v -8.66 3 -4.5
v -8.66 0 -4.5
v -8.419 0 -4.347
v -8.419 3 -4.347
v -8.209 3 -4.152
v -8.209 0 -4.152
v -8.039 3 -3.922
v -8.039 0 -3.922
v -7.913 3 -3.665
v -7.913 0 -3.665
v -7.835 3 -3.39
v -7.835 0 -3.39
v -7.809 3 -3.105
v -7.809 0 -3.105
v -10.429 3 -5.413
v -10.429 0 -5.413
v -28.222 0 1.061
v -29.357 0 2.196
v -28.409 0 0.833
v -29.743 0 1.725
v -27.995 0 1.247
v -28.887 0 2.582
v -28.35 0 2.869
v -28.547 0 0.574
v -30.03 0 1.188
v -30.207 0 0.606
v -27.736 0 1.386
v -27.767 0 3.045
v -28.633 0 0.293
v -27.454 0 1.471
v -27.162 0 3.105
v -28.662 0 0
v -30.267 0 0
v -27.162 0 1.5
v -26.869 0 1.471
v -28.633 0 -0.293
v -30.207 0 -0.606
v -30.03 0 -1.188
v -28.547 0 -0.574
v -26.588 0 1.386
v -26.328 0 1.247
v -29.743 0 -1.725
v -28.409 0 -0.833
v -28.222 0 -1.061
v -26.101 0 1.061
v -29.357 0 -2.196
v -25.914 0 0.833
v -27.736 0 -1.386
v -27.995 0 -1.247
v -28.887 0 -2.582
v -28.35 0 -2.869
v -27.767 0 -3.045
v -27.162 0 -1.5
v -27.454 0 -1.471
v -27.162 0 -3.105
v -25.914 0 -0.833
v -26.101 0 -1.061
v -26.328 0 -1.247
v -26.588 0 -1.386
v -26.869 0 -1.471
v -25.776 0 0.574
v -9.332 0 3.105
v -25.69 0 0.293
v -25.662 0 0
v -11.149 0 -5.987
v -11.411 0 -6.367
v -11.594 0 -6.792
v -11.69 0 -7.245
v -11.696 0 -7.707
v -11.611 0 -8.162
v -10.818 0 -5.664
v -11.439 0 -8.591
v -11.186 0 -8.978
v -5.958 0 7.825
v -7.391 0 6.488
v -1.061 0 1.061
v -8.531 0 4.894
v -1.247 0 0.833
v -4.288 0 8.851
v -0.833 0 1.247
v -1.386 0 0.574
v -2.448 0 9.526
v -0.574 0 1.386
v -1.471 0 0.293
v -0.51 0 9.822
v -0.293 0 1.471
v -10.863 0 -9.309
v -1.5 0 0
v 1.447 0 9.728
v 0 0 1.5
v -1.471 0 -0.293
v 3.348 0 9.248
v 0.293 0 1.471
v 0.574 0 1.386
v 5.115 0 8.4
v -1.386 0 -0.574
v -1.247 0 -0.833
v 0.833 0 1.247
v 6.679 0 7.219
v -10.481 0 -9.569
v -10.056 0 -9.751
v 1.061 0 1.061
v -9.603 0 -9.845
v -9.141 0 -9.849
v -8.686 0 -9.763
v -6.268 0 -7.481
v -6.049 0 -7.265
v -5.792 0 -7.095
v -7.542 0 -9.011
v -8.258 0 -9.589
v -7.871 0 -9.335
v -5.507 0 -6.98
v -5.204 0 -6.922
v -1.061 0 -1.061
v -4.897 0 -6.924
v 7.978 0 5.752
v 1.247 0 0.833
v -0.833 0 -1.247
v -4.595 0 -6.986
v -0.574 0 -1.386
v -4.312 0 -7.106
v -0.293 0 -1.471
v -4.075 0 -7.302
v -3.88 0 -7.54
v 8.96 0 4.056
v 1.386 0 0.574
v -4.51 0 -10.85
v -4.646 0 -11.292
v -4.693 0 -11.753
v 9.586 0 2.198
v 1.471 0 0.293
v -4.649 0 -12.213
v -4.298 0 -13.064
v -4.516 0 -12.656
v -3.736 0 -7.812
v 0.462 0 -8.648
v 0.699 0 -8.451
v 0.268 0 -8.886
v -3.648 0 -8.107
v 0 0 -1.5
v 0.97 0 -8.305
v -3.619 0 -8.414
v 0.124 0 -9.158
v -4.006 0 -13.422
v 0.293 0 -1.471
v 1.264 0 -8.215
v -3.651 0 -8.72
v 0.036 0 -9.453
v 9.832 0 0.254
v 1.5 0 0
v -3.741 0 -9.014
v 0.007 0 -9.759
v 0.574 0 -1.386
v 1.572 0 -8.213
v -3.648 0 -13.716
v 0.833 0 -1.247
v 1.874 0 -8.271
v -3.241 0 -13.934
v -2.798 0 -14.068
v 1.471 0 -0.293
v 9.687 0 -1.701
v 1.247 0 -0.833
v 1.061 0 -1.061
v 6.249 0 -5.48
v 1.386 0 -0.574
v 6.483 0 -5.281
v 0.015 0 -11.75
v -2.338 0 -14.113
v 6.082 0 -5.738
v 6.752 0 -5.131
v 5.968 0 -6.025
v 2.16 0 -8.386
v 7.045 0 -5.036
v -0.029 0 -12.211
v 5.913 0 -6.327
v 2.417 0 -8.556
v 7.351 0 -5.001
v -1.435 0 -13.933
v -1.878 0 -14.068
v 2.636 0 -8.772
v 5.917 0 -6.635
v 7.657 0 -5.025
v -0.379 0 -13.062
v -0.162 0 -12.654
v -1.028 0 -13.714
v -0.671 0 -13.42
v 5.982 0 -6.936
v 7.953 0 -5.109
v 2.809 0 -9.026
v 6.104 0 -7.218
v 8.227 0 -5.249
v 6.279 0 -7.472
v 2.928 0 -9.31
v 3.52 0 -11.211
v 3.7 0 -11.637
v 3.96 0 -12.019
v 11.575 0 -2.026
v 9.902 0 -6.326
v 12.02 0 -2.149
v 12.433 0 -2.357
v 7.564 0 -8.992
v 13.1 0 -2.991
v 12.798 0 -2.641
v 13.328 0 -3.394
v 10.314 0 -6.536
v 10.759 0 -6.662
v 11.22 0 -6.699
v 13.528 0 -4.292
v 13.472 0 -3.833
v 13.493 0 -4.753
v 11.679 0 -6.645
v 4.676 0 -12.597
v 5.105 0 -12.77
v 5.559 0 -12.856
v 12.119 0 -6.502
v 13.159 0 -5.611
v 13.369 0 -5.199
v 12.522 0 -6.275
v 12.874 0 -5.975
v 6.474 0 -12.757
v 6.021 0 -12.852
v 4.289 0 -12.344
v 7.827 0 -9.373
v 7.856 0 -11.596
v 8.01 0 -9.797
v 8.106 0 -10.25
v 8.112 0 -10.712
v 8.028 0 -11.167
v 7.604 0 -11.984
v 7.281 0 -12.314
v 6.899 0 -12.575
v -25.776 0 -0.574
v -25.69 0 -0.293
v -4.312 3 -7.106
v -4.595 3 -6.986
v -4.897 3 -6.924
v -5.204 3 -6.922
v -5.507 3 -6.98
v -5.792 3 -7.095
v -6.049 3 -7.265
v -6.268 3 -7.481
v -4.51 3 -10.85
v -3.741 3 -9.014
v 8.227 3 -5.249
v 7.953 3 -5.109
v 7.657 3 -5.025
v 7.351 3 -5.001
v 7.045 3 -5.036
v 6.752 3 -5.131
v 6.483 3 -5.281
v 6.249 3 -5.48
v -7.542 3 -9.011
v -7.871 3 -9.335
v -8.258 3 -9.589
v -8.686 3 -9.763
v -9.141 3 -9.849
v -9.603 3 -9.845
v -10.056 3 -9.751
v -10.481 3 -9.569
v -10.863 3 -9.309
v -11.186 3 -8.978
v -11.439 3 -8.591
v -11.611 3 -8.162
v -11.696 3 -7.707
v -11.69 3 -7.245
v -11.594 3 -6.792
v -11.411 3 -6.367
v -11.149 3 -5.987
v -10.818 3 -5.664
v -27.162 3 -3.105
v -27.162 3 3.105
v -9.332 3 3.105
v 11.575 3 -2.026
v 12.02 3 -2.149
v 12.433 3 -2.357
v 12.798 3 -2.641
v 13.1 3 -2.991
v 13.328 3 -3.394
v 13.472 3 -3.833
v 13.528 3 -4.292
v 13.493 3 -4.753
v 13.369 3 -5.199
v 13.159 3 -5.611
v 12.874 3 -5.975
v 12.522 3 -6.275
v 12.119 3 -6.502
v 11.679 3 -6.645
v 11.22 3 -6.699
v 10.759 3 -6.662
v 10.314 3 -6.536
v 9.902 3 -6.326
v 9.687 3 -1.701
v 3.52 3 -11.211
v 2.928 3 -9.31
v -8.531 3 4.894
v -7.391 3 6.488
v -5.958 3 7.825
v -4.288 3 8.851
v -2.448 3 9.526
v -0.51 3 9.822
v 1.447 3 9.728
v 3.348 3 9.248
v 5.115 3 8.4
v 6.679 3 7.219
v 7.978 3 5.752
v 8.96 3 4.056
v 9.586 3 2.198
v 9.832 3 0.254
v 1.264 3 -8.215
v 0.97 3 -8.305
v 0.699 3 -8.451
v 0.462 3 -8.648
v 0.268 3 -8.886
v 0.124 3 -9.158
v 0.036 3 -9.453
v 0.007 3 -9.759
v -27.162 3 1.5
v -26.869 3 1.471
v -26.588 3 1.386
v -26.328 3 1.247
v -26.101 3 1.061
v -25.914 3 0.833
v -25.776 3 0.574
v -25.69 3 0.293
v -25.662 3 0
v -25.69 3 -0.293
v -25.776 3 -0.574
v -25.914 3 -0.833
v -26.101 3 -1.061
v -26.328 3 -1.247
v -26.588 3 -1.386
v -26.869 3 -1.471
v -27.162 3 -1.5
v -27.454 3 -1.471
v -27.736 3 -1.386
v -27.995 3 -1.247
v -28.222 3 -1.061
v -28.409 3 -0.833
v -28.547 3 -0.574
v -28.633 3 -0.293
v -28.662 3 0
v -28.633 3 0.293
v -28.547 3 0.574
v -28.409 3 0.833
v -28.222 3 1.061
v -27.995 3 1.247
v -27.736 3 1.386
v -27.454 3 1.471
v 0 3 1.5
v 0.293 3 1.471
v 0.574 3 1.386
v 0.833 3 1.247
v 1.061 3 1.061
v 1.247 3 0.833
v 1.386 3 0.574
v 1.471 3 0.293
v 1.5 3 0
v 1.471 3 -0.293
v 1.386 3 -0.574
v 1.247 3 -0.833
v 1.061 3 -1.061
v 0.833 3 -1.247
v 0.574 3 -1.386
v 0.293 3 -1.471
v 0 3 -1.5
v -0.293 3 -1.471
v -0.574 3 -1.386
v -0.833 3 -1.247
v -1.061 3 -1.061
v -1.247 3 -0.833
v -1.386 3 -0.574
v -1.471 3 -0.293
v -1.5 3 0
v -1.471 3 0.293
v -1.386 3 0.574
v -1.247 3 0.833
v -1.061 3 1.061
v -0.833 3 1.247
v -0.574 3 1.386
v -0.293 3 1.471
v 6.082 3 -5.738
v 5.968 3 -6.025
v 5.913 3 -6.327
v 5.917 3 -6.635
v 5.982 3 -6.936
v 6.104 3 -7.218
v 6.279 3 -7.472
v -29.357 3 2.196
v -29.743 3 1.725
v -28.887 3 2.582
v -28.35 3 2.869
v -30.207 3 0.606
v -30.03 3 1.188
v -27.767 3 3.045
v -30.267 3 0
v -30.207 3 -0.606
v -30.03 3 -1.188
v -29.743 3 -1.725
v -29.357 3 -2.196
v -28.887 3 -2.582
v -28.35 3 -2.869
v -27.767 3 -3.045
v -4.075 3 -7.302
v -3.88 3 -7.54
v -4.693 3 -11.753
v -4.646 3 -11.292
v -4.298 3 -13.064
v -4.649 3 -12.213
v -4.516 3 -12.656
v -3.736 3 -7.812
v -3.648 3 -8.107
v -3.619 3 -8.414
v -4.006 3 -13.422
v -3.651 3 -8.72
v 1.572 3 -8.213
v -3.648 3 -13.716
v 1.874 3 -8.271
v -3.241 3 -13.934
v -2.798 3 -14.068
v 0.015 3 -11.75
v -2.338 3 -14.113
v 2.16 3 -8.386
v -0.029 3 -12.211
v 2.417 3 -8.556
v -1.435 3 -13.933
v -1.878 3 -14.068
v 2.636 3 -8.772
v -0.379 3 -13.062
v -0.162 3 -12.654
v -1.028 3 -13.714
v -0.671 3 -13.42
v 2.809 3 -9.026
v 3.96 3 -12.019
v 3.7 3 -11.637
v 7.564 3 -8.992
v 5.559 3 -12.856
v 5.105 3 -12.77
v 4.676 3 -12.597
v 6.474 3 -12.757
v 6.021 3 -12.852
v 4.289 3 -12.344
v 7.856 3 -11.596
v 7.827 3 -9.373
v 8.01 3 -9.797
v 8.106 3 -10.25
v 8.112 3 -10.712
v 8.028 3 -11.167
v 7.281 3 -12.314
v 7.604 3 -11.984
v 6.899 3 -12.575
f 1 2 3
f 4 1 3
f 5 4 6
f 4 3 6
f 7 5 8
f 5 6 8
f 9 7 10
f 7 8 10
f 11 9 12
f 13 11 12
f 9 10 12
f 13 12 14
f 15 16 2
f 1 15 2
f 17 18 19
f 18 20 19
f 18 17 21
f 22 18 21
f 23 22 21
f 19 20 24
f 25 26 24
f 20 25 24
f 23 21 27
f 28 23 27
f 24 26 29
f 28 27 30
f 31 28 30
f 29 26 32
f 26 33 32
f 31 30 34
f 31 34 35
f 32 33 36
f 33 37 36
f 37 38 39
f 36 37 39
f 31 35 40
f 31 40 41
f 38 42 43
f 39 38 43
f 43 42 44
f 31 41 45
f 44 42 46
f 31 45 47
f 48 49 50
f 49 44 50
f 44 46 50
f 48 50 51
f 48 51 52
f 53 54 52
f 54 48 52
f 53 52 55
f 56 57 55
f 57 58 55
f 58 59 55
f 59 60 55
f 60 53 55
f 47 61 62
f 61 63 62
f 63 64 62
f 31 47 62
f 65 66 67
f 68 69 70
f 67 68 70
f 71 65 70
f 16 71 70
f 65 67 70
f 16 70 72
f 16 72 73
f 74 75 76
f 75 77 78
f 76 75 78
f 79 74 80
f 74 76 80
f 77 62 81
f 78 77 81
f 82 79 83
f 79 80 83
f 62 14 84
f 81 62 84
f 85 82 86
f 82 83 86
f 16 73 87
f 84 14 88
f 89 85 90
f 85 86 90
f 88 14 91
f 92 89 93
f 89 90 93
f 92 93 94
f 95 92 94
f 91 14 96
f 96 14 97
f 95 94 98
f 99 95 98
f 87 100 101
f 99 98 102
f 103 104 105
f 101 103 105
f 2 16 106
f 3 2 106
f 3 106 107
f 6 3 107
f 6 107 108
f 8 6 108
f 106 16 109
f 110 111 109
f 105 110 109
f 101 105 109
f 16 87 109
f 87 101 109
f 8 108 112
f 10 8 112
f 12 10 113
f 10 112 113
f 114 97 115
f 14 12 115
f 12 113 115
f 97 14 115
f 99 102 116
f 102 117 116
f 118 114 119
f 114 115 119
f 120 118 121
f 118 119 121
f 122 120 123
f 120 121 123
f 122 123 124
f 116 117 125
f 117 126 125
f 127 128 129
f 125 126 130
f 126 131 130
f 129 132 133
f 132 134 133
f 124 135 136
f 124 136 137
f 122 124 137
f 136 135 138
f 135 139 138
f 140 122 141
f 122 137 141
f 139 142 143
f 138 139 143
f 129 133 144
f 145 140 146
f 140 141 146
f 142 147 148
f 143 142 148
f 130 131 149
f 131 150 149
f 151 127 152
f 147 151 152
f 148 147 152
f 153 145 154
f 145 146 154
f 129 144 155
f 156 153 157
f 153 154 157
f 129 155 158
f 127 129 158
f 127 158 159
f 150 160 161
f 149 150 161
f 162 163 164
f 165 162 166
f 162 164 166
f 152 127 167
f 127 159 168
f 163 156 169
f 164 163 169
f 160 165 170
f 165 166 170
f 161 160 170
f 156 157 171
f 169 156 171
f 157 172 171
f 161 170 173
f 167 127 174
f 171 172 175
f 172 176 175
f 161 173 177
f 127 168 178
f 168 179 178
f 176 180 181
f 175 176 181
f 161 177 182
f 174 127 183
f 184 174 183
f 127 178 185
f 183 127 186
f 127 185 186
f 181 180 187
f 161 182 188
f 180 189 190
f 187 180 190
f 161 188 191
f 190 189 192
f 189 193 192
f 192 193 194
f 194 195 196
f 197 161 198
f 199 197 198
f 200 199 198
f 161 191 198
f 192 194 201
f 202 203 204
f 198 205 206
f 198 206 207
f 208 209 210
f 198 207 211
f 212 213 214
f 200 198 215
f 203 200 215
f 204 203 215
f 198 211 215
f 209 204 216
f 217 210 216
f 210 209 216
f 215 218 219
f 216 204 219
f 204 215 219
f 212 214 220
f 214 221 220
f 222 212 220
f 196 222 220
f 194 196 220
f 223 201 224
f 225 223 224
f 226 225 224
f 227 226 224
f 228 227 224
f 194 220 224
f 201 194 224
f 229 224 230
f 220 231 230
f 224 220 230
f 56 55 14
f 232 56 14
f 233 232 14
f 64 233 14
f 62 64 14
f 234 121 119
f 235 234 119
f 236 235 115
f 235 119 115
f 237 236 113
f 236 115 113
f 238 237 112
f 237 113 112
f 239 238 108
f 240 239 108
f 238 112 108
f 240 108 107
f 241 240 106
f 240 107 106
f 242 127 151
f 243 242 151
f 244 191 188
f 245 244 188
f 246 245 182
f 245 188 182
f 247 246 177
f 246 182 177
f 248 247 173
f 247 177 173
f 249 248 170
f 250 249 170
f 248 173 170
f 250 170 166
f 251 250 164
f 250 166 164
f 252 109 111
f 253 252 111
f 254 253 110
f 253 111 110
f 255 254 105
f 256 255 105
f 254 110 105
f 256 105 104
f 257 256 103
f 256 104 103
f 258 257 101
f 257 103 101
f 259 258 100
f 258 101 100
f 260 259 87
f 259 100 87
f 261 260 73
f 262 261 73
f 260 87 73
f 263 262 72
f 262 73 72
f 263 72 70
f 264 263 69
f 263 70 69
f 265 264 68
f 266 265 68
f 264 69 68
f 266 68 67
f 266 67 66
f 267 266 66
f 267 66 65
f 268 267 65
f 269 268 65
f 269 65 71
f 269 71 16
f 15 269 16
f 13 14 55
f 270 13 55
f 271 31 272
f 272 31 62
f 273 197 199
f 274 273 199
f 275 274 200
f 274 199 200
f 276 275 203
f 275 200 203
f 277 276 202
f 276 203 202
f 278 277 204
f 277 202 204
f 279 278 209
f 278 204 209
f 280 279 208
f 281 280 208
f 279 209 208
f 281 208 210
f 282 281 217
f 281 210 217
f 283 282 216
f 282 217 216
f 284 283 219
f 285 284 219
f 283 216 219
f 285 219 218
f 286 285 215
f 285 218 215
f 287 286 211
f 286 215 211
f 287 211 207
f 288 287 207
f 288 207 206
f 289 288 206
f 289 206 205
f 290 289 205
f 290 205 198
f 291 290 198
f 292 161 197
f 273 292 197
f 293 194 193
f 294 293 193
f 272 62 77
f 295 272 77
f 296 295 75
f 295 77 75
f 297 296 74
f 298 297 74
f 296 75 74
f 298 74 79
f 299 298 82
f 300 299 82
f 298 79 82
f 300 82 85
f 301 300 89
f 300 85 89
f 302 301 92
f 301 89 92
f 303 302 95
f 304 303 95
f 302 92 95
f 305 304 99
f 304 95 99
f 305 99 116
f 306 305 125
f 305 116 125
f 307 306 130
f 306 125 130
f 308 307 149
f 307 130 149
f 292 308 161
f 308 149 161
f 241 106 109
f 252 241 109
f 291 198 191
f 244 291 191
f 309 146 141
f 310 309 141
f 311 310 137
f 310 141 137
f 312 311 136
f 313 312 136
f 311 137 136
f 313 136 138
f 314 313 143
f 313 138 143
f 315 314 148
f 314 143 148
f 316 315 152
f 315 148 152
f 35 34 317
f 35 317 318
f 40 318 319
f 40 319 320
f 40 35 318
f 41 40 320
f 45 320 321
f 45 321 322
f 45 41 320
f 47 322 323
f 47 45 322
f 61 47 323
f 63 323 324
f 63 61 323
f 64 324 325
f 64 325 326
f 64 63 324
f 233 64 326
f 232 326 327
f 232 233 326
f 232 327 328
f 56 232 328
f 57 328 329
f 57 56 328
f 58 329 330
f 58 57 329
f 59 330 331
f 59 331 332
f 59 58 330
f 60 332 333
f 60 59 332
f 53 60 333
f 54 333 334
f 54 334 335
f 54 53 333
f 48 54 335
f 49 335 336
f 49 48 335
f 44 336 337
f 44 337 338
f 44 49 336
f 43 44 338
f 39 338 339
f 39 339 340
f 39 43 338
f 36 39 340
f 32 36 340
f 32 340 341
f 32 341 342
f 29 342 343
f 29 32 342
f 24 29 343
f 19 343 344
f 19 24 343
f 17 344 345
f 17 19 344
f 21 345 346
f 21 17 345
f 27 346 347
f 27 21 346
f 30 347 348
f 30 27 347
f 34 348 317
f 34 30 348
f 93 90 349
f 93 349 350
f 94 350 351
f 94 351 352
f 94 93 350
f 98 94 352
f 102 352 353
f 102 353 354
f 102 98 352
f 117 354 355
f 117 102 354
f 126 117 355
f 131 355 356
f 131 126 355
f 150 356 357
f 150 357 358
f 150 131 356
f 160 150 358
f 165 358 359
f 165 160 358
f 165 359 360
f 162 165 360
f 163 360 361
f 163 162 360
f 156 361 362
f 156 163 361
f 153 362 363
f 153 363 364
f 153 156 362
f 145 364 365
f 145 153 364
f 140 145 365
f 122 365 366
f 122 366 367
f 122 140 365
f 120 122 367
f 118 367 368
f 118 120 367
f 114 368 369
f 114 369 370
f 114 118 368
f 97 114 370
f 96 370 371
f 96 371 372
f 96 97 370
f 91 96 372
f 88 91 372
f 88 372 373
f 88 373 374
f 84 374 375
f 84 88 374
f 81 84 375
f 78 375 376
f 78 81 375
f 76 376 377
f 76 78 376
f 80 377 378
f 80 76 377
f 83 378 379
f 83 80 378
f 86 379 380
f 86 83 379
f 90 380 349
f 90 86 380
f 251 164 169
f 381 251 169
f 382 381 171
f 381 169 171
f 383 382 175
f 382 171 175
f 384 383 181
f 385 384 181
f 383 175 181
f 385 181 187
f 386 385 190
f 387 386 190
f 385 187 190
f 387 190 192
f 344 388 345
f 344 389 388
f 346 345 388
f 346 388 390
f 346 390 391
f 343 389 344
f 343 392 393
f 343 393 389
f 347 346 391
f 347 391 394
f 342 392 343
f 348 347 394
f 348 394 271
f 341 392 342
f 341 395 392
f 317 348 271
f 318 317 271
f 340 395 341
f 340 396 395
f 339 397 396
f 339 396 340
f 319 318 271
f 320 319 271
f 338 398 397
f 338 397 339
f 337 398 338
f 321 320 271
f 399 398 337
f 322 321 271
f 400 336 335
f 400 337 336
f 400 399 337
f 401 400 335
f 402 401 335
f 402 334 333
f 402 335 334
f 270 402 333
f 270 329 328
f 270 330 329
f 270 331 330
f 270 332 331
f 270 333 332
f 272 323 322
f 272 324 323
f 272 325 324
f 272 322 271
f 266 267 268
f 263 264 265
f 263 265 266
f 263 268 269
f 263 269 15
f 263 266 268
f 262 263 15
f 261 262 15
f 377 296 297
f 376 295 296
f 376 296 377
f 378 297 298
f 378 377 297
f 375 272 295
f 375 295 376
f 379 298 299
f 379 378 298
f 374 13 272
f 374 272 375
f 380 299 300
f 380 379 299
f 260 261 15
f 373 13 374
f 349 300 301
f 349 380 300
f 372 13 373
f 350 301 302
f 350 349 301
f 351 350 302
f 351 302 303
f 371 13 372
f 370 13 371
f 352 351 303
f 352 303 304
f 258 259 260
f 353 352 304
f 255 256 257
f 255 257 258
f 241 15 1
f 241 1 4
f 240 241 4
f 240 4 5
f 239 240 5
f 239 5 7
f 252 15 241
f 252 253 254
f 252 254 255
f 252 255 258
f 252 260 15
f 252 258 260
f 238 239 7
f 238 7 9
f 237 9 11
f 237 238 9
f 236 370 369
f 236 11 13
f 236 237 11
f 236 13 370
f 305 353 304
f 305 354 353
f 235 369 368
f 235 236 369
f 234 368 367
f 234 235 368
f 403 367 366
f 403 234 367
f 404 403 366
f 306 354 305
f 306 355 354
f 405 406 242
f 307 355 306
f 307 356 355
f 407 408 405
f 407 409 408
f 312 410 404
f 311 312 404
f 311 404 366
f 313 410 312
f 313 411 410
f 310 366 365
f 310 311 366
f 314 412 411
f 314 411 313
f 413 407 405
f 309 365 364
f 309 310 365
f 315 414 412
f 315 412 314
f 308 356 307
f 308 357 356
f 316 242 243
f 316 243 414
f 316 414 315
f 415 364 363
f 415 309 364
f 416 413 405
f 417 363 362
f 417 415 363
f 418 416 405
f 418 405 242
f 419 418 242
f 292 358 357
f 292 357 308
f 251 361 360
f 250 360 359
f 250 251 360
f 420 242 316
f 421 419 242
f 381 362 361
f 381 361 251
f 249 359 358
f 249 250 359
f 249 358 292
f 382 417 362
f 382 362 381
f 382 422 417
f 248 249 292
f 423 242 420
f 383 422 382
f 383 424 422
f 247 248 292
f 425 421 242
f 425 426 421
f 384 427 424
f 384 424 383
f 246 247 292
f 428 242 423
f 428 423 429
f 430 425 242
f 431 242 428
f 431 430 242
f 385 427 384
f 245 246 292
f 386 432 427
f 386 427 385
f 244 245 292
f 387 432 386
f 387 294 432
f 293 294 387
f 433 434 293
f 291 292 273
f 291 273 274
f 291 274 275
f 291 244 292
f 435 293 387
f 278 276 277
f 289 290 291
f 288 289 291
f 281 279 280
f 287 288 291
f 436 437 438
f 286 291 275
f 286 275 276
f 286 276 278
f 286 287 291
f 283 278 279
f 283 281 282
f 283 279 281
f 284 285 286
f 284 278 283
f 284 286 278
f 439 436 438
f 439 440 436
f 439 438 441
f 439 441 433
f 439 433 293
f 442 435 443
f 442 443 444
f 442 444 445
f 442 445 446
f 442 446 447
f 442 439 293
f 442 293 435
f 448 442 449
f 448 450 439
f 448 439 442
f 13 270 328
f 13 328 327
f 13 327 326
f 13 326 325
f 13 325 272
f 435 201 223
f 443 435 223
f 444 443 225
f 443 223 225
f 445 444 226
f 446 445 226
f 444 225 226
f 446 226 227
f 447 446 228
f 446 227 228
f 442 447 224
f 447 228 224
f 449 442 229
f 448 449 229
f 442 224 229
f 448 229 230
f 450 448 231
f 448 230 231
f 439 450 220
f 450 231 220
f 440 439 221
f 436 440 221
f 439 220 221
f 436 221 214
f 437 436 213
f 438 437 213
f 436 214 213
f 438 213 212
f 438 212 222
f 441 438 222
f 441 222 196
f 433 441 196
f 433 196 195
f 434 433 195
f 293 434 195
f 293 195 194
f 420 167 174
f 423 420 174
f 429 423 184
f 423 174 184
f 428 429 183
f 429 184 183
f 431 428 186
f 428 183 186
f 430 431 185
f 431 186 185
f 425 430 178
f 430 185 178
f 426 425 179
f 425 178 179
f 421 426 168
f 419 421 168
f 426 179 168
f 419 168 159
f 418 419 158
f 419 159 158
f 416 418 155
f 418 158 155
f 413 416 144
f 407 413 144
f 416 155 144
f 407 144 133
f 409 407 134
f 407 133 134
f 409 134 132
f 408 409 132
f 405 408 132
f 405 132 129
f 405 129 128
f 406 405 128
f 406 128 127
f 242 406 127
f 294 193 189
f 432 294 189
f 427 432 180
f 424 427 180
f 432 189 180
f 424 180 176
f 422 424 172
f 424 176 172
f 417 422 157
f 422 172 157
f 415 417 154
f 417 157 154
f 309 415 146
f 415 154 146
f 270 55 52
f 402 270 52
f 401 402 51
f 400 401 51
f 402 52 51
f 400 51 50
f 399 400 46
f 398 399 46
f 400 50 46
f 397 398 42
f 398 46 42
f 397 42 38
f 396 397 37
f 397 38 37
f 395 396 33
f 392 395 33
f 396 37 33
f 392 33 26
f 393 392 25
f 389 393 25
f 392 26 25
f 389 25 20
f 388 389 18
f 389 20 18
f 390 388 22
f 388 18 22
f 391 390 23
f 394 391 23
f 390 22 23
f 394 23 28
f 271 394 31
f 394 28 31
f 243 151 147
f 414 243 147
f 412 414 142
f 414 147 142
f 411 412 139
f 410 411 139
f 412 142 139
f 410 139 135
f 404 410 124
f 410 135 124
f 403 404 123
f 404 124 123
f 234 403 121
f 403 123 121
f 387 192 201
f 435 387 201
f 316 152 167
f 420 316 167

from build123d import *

# Parameters (mm, degrees)
CROQUIS1_R              = 1.5
SALIENTE_EXTRUIR1_DEPTH = 3


with BuildPart() as part:
    # Croquis1 → Saliente-Extruir1 (new body)
    with BuildSketch(Plane(origin=(0, 0, 0), x_dir=(1, 0, 0), z_dir=(0, 1, 0))):
        with BuildLine():
            Line((-27.161614769, -3.105), (-9.331998714, -3.105))
            ThreePointArc((-9.331998714, -3.105), (2.40938914, -9.535306444), (9.686839463, 1.700695802))
            Line((9.686839463, 1.700695802), (11.574510255, 2.02597122))
            ThreePointArc((11.574510255, 2.02597122), (13.368530359, 5.198598559), (9.902464329, 6.325744796))
            Line((9.902464329, 6.325744796), (8.227399936, 5.249463408))
            ThreePointArc((8.227399936, 5.249463408), (7.196926129, 5.010869422), (6.248965214, 5.480095872))
            ThreePointArc((6.248965214, 5.480095872), (5.907504818, 6.481199341), (6.278579258, 7.471707855))
            Line((6.278579258, 7.471707855), (7.564320065, 8.991935775))
            ThreePointArc((7.564320065, 8.991935775), (6.899293653, 12.575483213), (3.519617395, 11.210983026))
            Line((3.519617395, 11.210983026), (2.928263966, 9.309793011))
            ThreePointArc((2.928263966, 9.309793011), (2.29224049, 8.464643619), (1.264447351, 8.214754404))
            ThreePointArc((1.264447351, 8.214754404), (0.359376606, 8.762157641), (0.006949519, 9.759453236))
            Line((0.006949519, 9.759453236), (0.014700448, 11.750473647))
            ThreePointArc((0.014700448, 11.750473647), (-2.798199231, 14.068159511), (-4.510097634, 10.850477702))
            Line((-4.510097634, 10.850477702), (-3.741039257, 9.013966998))
            ThreePointArc((-3.741039257, 9.013966998), (-3.685009949, 7.957716993), (-4.31171948, 7.105638053))
            ThreePointArc((-4.31171948, 7.105638053), (-5.356907913, 6.943205), (-6.267931977, 7.480641985))
            Line((-6.267931977, 7.480641985), (-7.541797671, 9.010834307))
            ThreePointArc((-7.541797671, 9.010834307), (-11.186383596, 8.978187623), (-10.429487856, 5.412913271))
            Line((-10.429487856, 5.412913271), (-8.659868635, 4.500405648))
            ThreePointArc((-8.659868635, 4.500405648), (-8.038781185, 3.922072963), (-7.809412295, 3.105))
            Line((-7.809412295, 3.105), (-27.161614769, 3.105))
            ThreePointArc((-27.161614769, 3.105), (-30.266614769, 0), (-27.161614769, -3.105))
        make_face()
        with Locations(Location((0, 0, 0), (0, 0, 270))):
            Circle(CROQUIS1_R, mode=Mode.SUBTRACT)
        with Locations(Location((-27.161614769, 0, 0), (0, 0, 270))):
            Circle(CROQUIS1_R, mode=Mode.SUBTRACT)
    extrude(amount=SALIENTE_EXTRUIR1_DEPTH)


solid = part.part
